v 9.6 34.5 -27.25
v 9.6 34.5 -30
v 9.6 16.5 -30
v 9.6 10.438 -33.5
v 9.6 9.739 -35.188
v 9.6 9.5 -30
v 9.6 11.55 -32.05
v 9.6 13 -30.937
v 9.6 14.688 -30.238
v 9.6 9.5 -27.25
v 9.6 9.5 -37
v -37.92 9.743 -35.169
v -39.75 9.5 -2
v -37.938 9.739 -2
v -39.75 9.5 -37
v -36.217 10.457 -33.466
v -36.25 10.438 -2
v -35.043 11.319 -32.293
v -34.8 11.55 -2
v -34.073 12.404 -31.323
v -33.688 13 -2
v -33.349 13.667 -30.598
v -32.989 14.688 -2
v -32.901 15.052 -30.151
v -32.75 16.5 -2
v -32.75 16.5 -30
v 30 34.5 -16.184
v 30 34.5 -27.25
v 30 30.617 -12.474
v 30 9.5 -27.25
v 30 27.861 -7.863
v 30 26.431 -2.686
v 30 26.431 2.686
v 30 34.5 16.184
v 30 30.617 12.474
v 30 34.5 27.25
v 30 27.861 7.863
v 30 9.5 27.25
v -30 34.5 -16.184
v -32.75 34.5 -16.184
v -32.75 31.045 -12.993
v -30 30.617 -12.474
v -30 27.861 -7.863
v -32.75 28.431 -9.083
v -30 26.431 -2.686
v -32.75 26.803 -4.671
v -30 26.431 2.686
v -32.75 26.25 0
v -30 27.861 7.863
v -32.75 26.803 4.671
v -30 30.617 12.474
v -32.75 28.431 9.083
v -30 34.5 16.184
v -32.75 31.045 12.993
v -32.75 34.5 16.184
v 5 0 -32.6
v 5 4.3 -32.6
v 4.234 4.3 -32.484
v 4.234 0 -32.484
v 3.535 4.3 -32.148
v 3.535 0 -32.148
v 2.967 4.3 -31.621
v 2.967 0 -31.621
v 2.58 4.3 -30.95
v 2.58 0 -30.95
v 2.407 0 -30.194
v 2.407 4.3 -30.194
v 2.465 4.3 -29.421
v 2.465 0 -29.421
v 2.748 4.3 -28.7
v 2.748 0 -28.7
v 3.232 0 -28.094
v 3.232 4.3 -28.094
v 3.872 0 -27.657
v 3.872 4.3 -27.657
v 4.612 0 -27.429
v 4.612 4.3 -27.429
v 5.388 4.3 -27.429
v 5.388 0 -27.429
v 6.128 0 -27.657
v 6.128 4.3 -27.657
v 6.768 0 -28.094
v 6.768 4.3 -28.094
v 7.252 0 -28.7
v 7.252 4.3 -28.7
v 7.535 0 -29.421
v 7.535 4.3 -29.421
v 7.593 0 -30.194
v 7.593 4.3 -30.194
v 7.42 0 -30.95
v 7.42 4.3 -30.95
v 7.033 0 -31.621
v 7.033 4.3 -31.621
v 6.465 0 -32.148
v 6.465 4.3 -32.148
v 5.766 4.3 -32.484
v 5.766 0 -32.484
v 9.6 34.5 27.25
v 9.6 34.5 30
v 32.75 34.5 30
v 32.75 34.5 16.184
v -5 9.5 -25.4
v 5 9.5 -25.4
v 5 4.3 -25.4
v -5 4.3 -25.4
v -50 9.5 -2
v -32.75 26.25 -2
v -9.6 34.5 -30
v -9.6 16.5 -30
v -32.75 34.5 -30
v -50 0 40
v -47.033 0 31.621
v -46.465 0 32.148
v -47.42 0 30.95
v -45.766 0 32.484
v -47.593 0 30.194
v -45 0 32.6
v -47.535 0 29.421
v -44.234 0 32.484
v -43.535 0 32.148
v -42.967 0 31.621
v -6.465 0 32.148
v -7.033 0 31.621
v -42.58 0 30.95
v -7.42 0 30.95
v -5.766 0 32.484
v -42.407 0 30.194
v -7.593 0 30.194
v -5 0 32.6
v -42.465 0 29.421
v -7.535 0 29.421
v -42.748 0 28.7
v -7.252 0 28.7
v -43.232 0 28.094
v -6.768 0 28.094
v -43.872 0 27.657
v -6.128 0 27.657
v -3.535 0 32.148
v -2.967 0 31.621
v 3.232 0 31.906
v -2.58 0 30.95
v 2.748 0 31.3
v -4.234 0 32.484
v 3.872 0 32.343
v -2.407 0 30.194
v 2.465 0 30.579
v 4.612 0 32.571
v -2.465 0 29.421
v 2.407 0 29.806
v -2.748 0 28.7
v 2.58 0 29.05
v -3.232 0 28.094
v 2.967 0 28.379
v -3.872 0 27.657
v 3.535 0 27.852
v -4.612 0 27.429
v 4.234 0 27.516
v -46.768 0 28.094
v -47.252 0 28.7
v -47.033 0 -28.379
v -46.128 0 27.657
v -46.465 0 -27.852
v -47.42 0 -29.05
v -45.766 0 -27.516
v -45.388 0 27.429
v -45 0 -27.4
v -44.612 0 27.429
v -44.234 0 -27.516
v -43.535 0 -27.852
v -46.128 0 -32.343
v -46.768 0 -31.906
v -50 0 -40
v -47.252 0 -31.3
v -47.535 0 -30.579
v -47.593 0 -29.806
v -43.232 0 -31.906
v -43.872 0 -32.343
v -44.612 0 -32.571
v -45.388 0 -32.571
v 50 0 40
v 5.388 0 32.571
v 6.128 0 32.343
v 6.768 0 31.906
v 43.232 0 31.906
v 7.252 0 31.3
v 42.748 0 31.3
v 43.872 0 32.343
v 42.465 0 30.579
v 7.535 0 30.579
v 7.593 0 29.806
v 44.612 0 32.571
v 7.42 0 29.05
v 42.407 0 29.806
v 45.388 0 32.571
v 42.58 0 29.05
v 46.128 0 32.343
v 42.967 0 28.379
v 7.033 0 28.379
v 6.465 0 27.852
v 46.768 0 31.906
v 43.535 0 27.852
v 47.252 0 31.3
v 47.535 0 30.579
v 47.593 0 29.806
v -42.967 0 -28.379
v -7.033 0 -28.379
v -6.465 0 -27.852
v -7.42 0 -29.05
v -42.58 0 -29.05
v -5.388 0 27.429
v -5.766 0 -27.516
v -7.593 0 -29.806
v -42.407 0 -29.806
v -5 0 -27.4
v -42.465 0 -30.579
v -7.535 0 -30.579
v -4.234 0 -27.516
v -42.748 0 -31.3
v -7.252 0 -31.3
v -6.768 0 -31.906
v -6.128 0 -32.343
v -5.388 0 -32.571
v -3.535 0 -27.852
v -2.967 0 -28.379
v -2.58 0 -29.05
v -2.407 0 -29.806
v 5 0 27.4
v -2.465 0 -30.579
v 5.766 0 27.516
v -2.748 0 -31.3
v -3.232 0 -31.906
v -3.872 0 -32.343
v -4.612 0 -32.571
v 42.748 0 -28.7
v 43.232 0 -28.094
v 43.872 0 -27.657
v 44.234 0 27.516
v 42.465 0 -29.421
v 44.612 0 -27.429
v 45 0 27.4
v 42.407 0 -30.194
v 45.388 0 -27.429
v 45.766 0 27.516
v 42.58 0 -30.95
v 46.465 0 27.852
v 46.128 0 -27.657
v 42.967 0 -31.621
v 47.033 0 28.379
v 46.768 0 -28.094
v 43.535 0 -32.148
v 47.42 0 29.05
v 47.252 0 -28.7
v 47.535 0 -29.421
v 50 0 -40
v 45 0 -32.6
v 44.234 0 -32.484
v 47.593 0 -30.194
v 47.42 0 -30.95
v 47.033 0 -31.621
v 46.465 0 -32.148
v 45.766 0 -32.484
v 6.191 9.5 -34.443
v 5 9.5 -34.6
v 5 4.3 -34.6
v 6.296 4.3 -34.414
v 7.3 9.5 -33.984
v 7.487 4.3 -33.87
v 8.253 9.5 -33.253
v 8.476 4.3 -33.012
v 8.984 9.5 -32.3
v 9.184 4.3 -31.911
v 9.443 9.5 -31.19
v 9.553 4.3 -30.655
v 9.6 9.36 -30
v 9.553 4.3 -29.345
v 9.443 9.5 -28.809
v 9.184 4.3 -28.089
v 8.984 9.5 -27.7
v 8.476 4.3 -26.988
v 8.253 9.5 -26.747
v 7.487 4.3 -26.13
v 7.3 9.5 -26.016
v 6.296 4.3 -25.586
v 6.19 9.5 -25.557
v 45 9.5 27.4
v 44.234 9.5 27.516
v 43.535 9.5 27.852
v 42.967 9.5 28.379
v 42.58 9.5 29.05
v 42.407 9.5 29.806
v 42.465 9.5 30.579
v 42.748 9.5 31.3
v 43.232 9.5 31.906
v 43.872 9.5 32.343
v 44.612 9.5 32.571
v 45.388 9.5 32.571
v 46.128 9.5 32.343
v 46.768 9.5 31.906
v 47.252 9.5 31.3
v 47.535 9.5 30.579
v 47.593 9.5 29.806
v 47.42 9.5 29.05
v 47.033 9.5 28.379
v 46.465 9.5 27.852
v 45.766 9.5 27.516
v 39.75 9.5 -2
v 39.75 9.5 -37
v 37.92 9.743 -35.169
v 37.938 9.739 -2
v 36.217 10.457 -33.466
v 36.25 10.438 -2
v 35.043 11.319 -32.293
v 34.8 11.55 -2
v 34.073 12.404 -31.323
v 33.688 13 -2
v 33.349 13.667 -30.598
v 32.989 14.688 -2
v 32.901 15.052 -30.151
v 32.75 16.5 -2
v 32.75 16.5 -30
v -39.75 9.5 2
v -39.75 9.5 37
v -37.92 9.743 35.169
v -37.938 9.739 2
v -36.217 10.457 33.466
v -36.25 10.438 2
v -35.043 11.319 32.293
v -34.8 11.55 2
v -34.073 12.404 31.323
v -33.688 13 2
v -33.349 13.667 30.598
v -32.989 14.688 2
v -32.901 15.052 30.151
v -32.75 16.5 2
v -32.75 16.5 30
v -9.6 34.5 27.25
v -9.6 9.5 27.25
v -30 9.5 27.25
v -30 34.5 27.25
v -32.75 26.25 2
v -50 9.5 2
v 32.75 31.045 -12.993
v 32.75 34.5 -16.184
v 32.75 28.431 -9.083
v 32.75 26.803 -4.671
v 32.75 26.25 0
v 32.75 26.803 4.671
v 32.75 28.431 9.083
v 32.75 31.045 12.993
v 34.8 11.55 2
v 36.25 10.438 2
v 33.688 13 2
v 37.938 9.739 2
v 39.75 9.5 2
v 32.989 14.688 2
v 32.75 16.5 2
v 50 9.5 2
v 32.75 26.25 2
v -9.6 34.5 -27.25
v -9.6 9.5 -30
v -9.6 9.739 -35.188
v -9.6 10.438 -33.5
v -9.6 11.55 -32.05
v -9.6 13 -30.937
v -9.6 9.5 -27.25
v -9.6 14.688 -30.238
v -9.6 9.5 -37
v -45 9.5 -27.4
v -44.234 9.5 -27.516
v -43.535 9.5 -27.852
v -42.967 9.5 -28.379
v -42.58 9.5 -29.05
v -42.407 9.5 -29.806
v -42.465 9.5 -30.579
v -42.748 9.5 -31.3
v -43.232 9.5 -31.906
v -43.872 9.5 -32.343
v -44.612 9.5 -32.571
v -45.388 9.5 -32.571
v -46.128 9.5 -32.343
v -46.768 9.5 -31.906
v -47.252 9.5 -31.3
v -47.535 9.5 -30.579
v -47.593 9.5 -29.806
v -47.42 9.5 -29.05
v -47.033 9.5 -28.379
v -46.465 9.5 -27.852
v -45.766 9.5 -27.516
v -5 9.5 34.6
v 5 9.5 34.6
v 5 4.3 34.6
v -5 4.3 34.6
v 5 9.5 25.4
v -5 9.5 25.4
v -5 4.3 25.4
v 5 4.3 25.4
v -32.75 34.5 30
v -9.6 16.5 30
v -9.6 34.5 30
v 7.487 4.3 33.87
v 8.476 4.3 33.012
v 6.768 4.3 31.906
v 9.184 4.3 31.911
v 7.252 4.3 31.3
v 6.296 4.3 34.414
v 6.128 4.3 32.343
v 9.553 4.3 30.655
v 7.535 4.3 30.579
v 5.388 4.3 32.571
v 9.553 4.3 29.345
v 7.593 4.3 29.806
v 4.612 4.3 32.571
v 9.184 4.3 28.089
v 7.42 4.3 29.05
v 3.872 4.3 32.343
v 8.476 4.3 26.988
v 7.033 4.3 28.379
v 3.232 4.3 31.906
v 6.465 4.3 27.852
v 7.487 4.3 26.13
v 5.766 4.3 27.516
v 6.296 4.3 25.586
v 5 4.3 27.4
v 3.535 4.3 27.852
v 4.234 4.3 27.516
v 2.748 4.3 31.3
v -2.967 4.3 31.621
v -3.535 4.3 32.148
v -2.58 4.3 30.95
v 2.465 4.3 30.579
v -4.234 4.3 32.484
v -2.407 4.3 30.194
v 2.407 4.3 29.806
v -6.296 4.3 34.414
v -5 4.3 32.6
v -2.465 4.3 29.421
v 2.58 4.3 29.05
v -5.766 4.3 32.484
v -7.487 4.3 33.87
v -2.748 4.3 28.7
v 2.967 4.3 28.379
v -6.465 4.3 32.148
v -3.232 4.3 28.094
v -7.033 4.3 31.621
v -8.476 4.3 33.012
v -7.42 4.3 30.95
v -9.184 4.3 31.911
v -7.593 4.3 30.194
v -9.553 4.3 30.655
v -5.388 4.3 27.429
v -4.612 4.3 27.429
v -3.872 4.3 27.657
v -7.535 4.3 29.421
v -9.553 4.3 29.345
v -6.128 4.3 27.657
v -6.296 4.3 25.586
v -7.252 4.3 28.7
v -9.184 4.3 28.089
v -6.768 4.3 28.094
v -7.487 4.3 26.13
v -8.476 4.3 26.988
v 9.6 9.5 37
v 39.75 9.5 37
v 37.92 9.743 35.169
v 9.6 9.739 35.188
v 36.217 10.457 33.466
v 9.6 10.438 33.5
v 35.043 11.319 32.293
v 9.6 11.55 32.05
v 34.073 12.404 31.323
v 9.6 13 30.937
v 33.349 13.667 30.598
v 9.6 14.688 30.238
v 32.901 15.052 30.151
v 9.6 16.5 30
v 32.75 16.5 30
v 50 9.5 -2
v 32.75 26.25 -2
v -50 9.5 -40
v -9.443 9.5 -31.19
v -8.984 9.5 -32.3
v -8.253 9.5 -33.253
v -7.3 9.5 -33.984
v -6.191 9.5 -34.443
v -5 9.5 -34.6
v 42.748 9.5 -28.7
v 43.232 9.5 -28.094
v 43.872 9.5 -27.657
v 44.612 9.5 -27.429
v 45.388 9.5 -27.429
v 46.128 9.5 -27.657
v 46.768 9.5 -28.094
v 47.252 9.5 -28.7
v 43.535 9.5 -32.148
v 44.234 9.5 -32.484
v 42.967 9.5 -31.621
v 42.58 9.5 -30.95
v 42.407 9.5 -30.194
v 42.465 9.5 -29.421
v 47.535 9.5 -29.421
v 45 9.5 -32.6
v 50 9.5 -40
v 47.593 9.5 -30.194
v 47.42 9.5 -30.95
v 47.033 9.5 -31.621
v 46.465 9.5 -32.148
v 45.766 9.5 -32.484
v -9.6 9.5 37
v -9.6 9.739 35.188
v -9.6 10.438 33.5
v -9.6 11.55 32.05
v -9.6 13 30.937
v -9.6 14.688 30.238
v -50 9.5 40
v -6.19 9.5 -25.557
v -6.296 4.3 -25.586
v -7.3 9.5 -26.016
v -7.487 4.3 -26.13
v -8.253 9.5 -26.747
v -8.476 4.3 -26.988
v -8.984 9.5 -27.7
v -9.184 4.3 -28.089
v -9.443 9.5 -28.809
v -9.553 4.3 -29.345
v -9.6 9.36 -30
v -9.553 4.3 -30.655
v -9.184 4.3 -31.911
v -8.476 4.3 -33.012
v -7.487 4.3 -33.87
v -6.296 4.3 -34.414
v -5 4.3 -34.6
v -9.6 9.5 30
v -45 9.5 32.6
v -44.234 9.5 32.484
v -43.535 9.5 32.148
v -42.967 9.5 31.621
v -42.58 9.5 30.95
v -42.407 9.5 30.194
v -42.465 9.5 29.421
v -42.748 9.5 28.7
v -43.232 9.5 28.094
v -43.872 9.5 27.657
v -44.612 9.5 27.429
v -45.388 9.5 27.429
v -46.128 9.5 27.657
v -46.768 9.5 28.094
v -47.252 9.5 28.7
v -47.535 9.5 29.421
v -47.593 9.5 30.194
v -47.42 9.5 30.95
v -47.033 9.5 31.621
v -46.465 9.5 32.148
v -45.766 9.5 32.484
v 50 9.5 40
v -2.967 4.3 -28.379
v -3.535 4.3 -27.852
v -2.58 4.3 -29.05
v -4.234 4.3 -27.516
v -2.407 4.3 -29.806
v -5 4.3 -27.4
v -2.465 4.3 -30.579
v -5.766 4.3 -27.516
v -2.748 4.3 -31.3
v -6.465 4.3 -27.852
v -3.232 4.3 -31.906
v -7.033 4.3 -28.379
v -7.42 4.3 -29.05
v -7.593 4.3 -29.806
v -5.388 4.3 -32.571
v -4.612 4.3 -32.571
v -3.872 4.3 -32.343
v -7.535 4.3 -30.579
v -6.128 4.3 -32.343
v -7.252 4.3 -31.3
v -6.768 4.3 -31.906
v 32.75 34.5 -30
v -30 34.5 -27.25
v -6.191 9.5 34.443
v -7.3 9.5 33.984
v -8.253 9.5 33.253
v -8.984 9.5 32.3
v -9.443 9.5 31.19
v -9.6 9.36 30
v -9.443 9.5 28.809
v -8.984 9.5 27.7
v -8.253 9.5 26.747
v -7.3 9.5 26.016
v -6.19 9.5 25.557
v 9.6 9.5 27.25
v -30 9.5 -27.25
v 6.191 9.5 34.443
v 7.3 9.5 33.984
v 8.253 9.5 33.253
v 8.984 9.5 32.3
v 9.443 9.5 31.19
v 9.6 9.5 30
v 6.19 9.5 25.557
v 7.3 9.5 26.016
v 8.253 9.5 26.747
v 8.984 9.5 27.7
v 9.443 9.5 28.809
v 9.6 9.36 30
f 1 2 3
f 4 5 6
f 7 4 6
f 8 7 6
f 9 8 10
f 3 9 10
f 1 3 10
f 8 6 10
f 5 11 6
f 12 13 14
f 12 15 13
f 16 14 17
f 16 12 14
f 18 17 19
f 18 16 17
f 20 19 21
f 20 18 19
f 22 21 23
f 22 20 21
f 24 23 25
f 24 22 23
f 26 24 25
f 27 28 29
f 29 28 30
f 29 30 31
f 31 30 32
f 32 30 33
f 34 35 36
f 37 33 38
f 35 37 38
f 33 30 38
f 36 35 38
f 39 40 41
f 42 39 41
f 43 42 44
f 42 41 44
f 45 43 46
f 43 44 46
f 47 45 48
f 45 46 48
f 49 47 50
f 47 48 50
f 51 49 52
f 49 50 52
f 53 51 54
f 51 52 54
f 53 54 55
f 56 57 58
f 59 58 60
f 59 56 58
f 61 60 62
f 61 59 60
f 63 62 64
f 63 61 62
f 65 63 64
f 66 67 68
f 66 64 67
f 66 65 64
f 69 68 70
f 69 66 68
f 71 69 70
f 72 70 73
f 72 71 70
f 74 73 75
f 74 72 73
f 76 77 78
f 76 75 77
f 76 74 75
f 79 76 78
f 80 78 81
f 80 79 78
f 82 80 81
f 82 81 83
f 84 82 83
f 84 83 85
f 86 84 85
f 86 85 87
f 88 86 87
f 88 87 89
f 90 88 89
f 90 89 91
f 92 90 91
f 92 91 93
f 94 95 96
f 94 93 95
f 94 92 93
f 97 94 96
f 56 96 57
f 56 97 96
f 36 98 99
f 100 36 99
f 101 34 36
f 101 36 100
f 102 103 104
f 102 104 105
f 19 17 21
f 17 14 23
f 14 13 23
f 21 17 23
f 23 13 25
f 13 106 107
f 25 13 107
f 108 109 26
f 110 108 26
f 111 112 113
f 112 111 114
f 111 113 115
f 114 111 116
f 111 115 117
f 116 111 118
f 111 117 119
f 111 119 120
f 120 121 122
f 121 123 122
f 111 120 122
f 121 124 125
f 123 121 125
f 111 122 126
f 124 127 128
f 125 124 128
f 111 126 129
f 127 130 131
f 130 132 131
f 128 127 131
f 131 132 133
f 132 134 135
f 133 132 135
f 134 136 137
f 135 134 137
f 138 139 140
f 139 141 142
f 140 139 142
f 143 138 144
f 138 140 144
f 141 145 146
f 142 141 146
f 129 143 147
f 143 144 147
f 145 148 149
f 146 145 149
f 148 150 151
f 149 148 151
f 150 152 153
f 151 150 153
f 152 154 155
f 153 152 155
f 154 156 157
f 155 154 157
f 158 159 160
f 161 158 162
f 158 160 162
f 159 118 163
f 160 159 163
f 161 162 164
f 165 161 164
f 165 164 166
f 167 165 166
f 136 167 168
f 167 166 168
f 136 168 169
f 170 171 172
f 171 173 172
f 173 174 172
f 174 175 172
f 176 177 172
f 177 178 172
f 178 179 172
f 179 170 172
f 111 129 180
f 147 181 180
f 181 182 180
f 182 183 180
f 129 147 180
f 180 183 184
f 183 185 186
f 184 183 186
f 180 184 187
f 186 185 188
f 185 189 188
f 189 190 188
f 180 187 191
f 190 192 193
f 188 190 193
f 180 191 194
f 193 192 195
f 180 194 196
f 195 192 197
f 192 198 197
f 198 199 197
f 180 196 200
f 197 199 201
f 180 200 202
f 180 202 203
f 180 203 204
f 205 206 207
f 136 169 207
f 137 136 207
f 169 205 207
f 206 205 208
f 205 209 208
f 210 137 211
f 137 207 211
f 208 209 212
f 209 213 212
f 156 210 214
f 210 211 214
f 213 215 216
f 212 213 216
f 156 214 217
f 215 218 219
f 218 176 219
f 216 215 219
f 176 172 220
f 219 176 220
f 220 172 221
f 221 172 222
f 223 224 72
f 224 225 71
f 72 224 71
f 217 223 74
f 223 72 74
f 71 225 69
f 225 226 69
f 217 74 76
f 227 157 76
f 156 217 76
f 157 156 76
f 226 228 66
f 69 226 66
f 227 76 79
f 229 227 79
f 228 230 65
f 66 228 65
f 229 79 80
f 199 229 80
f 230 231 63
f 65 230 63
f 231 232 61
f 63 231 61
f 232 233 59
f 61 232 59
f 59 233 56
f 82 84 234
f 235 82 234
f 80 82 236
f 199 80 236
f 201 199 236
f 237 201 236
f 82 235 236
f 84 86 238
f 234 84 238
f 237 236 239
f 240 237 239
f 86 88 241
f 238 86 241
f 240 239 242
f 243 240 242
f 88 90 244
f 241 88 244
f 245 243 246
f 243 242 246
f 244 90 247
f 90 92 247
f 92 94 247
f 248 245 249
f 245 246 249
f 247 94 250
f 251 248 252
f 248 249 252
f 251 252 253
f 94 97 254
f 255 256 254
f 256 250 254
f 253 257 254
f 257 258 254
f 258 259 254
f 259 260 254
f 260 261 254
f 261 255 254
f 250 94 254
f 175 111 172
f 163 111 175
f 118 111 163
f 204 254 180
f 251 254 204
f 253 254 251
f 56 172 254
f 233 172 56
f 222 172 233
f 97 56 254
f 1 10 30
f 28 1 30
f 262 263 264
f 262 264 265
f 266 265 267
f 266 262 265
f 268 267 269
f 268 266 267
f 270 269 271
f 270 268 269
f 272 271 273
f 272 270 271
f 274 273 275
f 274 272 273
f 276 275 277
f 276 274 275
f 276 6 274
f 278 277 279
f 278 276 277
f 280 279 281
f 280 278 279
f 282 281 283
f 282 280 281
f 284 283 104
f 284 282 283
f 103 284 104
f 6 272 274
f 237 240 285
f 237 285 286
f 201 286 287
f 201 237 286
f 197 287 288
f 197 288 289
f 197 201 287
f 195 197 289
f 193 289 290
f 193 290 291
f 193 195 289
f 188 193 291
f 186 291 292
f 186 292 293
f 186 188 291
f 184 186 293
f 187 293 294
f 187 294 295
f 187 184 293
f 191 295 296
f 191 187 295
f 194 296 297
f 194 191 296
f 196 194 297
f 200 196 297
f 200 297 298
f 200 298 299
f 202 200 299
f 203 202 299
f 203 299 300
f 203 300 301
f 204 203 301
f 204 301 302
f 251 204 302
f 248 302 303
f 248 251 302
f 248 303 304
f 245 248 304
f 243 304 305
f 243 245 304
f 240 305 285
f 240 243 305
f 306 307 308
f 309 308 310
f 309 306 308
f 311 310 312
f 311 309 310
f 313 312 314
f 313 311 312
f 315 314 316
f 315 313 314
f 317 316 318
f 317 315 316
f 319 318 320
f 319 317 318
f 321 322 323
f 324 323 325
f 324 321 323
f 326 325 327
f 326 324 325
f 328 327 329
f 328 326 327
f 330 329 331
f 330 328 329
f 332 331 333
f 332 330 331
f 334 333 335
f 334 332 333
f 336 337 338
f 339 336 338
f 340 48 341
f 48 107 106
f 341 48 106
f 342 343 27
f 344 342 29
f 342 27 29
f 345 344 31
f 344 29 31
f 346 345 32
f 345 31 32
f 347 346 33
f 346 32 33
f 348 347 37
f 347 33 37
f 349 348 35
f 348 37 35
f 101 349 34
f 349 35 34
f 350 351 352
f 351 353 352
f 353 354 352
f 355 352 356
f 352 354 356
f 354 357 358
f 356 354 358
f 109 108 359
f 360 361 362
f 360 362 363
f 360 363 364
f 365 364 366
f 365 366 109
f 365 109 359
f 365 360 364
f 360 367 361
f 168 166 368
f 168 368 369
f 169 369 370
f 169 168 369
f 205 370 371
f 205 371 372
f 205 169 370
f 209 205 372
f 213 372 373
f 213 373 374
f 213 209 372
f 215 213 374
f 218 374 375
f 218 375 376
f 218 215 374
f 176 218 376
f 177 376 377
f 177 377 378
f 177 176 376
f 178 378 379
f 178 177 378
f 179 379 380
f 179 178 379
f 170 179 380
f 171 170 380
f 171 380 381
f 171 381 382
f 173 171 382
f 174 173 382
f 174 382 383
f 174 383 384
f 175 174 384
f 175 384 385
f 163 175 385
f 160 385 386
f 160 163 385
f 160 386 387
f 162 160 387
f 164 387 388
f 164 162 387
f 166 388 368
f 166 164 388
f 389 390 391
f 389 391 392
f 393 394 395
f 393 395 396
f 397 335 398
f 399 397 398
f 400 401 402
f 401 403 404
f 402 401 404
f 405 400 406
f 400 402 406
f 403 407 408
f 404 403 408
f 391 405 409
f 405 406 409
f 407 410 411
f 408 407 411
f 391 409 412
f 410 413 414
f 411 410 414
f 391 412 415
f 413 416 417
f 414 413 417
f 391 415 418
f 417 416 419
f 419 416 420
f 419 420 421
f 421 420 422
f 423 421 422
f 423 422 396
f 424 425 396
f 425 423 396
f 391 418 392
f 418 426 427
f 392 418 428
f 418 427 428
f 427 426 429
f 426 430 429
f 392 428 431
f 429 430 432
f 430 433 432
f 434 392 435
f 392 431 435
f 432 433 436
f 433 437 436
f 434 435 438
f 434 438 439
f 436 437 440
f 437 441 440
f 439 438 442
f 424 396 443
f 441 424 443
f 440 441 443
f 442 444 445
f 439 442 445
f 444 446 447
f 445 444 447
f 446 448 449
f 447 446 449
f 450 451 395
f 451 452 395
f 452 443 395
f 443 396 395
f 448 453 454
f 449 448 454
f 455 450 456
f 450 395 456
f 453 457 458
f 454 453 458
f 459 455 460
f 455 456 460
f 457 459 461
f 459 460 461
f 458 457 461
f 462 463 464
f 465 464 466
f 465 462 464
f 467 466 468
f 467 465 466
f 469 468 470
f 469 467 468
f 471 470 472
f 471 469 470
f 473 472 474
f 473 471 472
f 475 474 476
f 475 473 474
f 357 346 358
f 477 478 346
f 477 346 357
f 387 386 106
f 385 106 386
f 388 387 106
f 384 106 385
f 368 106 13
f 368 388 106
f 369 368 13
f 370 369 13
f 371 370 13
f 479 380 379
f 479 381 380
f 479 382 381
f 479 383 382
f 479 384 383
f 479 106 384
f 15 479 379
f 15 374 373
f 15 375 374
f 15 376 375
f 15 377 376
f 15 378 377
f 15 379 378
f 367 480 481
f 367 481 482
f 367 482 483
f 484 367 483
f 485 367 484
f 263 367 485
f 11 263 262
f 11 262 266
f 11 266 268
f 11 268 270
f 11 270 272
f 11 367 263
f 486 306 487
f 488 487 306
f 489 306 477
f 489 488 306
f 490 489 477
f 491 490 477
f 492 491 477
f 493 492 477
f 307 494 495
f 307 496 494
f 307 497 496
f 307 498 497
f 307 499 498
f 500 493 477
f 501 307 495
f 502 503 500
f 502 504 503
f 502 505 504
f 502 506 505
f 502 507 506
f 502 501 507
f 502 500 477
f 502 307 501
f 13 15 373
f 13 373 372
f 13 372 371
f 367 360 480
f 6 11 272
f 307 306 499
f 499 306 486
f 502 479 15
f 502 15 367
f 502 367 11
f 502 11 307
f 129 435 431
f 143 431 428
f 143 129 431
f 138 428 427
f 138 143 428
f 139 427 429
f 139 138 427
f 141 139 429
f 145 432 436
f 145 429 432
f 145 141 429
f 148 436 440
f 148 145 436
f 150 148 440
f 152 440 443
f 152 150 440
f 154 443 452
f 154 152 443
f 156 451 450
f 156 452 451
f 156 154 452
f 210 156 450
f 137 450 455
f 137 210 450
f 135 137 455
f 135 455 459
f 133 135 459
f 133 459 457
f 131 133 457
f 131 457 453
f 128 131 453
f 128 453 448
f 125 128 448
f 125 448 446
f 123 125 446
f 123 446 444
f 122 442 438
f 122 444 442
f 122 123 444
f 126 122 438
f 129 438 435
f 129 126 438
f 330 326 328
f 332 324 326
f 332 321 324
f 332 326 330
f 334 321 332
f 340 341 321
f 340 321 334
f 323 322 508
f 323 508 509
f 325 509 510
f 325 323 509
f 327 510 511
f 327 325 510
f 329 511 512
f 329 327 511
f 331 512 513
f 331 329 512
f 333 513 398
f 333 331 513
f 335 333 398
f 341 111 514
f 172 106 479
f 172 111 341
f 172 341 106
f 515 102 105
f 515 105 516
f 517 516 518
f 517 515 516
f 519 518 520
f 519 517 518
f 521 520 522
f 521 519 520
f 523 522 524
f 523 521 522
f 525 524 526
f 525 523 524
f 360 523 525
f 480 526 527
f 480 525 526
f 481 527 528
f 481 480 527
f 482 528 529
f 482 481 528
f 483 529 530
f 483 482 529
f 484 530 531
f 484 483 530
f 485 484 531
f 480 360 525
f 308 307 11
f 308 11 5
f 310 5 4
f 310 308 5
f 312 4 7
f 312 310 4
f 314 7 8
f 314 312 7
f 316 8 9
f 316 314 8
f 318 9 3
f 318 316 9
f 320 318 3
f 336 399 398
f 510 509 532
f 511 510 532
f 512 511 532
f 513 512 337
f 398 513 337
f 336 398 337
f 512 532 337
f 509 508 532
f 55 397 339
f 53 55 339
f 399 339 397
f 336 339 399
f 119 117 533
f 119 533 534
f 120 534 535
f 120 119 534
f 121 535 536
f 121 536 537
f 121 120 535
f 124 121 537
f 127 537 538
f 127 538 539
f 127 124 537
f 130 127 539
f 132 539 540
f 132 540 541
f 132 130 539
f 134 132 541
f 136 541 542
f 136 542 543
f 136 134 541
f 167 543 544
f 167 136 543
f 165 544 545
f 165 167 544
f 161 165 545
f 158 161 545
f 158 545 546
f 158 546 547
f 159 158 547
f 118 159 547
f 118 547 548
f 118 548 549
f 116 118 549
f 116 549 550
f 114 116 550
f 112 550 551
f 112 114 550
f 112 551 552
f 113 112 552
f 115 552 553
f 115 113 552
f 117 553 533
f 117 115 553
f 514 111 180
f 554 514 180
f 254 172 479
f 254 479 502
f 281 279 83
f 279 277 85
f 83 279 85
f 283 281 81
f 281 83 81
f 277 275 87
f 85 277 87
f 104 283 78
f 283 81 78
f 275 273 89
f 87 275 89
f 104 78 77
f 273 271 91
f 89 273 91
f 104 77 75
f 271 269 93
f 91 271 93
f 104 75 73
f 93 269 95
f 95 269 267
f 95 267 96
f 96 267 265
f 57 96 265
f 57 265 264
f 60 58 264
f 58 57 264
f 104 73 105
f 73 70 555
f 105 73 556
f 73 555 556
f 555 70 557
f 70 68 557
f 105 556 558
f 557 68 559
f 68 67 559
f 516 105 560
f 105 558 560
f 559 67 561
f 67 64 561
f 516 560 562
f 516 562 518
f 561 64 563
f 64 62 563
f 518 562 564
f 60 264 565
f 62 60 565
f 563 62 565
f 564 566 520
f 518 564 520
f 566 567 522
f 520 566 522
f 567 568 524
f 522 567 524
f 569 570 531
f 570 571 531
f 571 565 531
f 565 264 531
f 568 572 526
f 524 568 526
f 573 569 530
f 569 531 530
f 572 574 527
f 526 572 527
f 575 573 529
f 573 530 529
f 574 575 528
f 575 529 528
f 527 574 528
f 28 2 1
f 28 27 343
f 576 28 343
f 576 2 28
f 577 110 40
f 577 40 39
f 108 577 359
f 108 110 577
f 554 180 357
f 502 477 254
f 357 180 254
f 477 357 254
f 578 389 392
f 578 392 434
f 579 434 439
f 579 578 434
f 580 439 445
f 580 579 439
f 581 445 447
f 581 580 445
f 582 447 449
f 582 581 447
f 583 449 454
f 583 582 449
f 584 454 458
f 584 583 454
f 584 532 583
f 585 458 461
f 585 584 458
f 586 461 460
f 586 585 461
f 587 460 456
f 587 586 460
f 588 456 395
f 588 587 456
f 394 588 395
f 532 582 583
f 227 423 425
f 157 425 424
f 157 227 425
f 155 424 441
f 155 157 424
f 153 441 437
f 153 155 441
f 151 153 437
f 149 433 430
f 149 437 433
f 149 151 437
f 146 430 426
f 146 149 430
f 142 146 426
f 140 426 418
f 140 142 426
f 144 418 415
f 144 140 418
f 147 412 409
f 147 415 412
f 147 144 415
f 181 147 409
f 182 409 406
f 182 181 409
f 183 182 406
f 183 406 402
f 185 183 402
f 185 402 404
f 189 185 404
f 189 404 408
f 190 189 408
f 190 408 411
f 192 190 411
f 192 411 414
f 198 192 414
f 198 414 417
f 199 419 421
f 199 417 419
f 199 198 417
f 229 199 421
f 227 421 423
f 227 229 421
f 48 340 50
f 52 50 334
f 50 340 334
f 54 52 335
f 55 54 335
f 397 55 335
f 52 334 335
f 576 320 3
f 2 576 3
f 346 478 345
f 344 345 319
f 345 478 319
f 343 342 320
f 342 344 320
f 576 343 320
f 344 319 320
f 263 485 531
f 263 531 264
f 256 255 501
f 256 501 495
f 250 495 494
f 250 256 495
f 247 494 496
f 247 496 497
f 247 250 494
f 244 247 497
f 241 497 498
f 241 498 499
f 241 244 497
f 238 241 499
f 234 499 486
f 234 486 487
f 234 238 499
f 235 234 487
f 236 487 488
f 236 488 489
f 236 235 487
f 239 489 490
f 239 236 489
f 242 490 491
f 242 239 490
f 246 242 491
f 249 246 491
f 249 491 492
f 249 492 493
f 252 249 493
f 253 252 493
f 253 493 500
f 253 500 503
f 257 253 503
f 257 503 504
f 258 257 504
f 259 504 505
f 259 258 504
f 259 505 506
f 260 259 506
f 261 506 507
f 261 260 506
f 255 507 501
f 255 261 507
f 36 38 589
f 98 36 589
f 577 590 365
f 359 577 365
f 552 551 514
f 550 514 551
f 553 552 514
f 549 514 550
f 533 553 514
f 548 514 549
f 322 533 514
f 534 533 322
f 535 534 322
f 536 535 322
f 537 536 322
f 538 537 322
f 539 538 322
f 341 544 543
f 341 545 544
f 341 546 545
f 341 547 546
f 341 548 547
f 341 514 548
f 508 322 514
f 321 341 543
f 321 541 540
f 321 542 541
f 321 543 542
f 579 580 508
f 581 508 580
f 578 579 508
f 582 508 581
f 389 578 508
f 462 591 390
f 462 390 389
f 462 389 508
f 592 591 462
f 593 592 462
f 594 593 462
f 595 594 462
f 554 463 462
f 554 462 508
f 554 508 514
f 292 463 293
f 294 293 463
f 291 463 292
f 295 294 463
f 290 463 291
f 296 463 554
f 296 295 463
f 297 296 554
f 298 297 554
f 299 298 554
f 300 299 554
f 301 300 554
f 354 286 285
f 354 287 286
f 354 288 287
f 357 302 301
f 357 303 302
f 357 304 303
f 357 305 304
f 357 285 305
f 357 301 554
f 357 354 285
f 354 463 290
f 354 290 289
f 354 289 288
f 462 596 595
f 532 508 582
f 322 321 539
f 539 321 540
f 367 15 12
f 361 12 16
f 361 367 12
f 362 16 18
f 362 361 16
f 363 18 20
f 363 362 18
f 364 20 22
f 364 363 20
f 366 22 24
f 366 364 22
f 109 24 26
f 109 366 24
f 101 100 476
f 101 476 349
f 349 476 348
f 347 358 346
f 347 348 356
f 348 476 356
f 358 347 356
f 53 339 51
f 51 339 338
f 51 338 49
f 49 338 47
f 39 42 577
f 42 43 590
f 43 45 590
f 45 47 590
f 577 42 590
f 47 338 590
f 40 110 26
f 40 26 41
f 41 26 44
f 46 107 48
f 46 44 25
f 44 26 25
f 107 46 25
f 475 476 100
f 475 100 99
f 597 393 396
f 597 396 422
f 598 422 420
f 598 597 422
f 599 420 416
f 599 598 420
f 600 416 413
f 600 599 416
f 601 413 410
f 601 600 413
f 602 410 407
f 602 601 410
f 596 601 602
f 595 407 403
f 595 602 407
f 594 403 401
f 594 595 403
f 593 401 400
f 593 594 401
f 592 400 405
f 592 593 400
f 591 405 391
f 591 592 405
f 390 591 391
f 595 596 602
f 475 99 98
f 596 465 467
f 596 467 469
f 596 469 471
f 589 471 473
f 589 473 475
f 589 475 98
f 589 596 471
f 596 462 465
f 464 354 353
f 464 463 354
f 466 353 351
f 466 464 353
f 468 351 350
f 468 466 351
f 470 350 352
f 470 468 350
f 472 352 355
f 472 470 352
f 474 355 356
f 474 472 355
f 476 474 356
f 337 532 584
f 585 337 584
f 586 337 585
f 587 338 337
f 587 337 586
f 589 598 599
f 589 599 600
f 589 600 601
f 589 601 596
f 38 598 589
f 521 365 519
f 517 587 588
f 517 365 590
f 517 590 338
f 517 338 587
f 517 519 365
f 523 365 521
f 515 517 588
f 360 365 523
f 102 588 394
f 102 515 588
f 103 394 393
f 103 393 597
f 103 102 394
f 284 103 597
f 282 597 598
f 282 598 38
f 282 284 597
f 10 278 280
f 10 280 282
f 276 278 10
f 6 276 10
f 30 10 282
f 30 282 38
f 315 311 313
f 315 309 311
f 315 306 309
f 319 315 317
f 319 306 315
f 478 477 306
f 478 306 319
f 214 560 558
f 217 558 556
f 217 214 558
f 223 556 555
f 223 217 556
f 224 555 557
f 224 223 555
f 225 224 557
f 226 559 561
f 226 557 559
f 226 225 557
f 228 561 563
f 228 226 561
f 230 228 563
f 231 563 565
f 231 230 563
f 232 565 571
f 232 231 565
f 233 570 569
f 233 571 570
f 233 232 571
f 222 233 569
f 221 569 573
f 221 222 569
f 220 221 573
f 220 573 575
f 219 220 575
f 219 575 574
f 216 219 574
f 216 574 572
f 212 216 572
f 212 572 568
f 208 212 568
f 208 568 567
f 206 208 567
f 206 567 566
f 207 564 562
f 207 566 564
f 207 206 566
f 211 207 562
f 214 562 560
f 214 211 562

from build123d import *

# Parameters (mm, degrees)
SKETCH_1_W           = 100
SKETCH_1_H           = 80
SKETCH_1_R           = 2.6
EXTRUDE_1_DEPTH      = 9.5
CUT_EXTRUDE_1_DEPTH  = 5.2
EXTRUDE_2_DEPTH      = 25
FILLET_1_R           = 7
SKETCH_7_R           = 20
CUT_EXTRUDE_2_DEPTH  = 99.172361182
EXTRUDE_3_DEPTH      = 2
EXTRUDE_3_DEPTH_BACK = 2


with BuildPart() as part:
    # 草图1 → 凸台-拉伸1 (new body)
    with BuildSketch(Plane(origin=(0, 0, 0), x_dir=(1, 0, 0), z_dir=(0, 1, 0))):
        Rectangle(SKETCH_1_W, SKETCH_1_H)
        with Locations(Location((-45, 30, 0), (0, 0, 270))):
            Circle(SKETCH_1_R, mode=Mode.SUBTRACT)
        with Locations(Location((-5, 30, 0), (0, 0, 270))):
            Circle(SKETCH_1_R, mode=Mode.SUBTRACT)
        with Locations(Location((-5, -30, 0), (0, 0, 270))):
            Circle(SKETCH_1_R, mode=Mode.SUBTRACT)
        with Locations(Location((-45, -30, 0), (0, 0, 270))):
            Circle(SKETCH_1_R, mode=Mode.SUBTRACT)
        with Locations(Location((45, -30, 0), (0, 0, 90))):
            Circle(SKETCH_1_R, mode=Mode.SUBTRACT)
        with Locations(Location((5, -30, 0), (0, 0, 90))):
            Circle(SKETCH_1_R, mode=Mode.SUBTRACT)
        with Locations(Location((5, 30, 0), (0, 0, 90))):
            Circle(SKETCH_1_R, mode=Mode.SUBTRACT)
        with Locations(Location((45, 30, 0), (0, 0, 90))):
            Circle(SKETCH_1_R, mode=Mode.SUBTRACT)
    extrude(amount=EXTRUDE_1_DEPTH)

    # 草图4 → 切除-拉伸1 (cut)
    with BuildSketch(Plane(origin=(0, 9.5, 0), x_dir=(1, 0, 0), z_dir=(0, 1, 0))):
        with BuildLine():
            Line((-5, 34.6), (5, 34.6))
            ThreePointArc((5, 34.6), (9.6, 30), (5, 25.4))
            Line((5, 25.4), (-5, 25.4))
            ThreePointArc((-5, 25.4), (-9.6, 30), (-5, 34.6))
        make_face()
        with BuildLine():
            Line((-5, -25.4), (5, -25.4))
            ThreePointArc((5, -25.4), (9.6, -30), (5, -34.6))
            Line((5, -34.6), (-5, -34.6))
            ThreePointArc((-5, -34.6), (-9.6, -30), (-5, -25.4))
        make_face()
    extrude(amount=-CUT_EXTRUDE_1_DEPTH, mode=Mode.SUBTRACT)

    # 草图5 → 凸台-拉伸2 (add)
    with BuildSketch(Plane(origin=(0, 9.5, 0), x_dir=(1, 0, 0), z_dir=(0, 1, 0))):
        Polygon((-9.6, 27.25), (-9.6, 29.999521433), (-32.75, 29.999521433), (-32.75, -29.999521433), (-9.6, -29.999521433), (-9.6, -27.25), (-30, -27.25), (-30, 27.25), align=None)
        Polygon((32.75, 29.999521433), (9.6, 29.999521433), (9.6, 27.25), (30, 27.25), (30, -27.25), (9.6, -27.25), (9.6, -29.999521433), (32.75, -29.999521433), align=None)
    extrude(amount=EXTRUDE_2_DEPTH)

    # 圆角1
    # the kernel refuses this fillet: 7 mm, written as the material it adds along each edge
    with BuildSketch(Plane(origin=(32.75, 9.5, 29.999521433), x_dir=(1, 0, 0), z_dir=(0, 0, -1)), Plane(origin=(-32.75, 9.5, -29.999521433), x_dir=(-1, 0, 0), z_dir=(0, 0, 1))) as fillet_1_piece_1:
        with BuildLine():
            CenterArc((FILLET_1_R, -FILLET_1_R), FILLET_1_R, 90, 90)
            Line((0, -FILLET_1_R), (-FILLET_1_R * 0.02, -FILLET_1_R))
            Line((-FILLET_1_R * 0.02, -FILLET_1_R), (-FILLET_1_R * 0.02, FILLET_1_R * 0.02))
            Line((-FILLET_1_R * 0.02, FILLET_1_R * 0.02), (FILLET_1_R, FILLET_1_R * 0.02))
            Line((FILLET_1_R, FILLET_1_R * 0.02), (FILLET_1_R, 0))
        make_face()
    extrude(amount=59.999042867)
    with BuildSketch(Plane(origin=(32.75, 9.5, -29.999521433), x_dir=(0, 0, -1), z_dir=(-1, 0, 0)), Plane(origin=(9.6, 9.5, 29.999521433), x_dir=(0, 0, 1), z_dir=(1, 0, 0)), Plane(origin=(-9.6, 9.5, -29.999521433), x_dir=(0, 0, -1), z_dir=(-1, 0, 0)), Plane(origin=(-32.75, 9.5, 29.999521433), x_dir=(0, 0, 1), z_dir=(1, 0, 0))) as fillet_1_piece_2:
        with BuildLine():
            CenterArc((FILLET_1_R, -FILLET_1_R), FILLET_1_R, 90, 90)
            Line((0, -FILLET_1_R), (-FILLET_1_R * 0.02, -FILLET_1_R))
            Line((-FILLET_1_R * 0.02, -FILLET_1_R), (-FILLET_1_R * 0.02, FILLET_1_R * 0.02))
            Line((-FILLET_1_R * 0.02, FILLET_1_R * 0.02), (FILLET_1_R, FILLET_1_R * 0.02))
            Line((FILLET_1_R, FILLET_1_R * 0.02), (FILLET_1_R, 0))
        make_face()
    extrude(amount=23.15)
    with BuildSketch(Plane(origin=(9.6, 9.5, 29.999521433), x_dir=(0, 0, 1), z_dir=(1, 0, 0))) as fillet_1_piece_3a_section:
        with BuildLine():
            CenterArc((FILLET_1_R, -FILLET_1_R), FILLET_1_R, 90, 90)
            Line((0, -FILLET_1_R), (-FILLET_1_R * 0.02, -FILLET_1_R))
            Line((-FILLET_1_R * 0.02, -FILLET_1_R), (-FILLET_1_R * 0.02, FILLET_1_R * 0.02))
            Line((-FILLET_1_R * 0.02, FILLET_1_R * 0.02), (FILLET_1_R, FILLET_1_R * 0.02))
            Line((FILLET_1_R, FILLET_1_R * 0.02), (FILLET_1_R, 0))
        make_face()
    fillet_1_piece_3a = extrude(amount=40.65, mode=Mode.PRIVATE)
    fillet_1_piece_3a = split(fillet_1_piece_3a, bisect_by=Plane(origin=(32.75, 11.0847658, 31.584287233), z_dir=(1, 0, 0)), keep=Keep.TOP, mode=Mode.PRIVATE)
    with BuildSketch(Plane(origin=(32.75, 9.5, 47.499521433), x_dir=(1, 0, 0), z_dir=(0, 0, -1))) as fillet_1_piece_3b_section:
        with BuildLine():
            CenterArc((FILLET_1_R, -FILLET_1_R), FILLET_1_R, 90, 90)
            Line((0, -FILLET_1_R), (-FILLET_1_R * 0.02, -FILLET_1_R))
            Line((-FILLET_1_R * 0.02, -FILLET_1_R), (-FILLET_1_R * 0.02, FILLET_1_R * 0.02))
            Line((-FILLET_1_R * 0.02, FILLET_1_R * 0.02), (FILLET_1_R, FILLET_1_R * 0.02))
            Line((FILLET_1_R, FILLET_1_R * 0.02), (FILLET_1_R, 0))
        make_face()
    fillet_1_piece_3b = extrude(amount=77.499042867, mode=Mode.PRIVATE)
    fillet_1_piece_3b = split(fillet_1_piece_3b, bisect_by=Plane(origin=(34.3347658, 11.0847658, 29.999521433), z_dir=(0, 0, 1)), keep=Keep.TOP, mode=Mode.PRIVATE)
    fillet_1_piece_3 = fillet_1_piece_3a & fillet_1_piece_3b
    add(fillet_1_piece_3)
    with BuildSketch(Plane(origin=(32.75, 9.5, 29.999521433), x_dir=(1, 0, 0), z_dir=(0, 0, -1))) as fillet_1_piece_4a_section:
        with BuildLine():
            CenterArc((FILLET_1_R, -FILLET_1_R), FILLET_1_R, 90, 90)
            Line((0, -FILLET_1_R), (-FILLET_1_R * 0.02, -FILLET_1_R))
            Line((-FILLET_1_R * 0.02, -FILLET_1_R), (-FILLET_1_R * 0.02, FILLET_1_R * 0.02))
            Line((-FILLET_1_R * 0.02, FILLET_1_R * 0.02), (FILLET_1_R, FILLET_1_R * 0.02))
            Line((FILLET_1_R, FILLET_1_R * 0.02), (FILLET_1_R, 0))
        make_face()
    fillet_1_piece_4a = extrude(amount=77.499042867, mode=Mode.PRIVATE)
    fillet_1_piece_4a = split(fillet_1_piece_4a, bisect_by=Plane(origin=(34.3347658, 11.0847658, -29.999521433), z_dir=(0, 0, -1)), keep=Keep.TOP, mode=Mode.PRIVATE)
    with BuildSketch(Plane(origin=(50.25, 9.5, -29.999521433), x_dir=(0, 0, -1), z_dir=(-1, 0, 0))) as fillet_1_piece_4b_section:
        with BuildLine():
            CenterArc((FILLET_1_R, -FILLET_1_R), FILLET_1_R, 90, 90)
            Line((0, -FILLET_1_R), (-FILLET_1_R * 0.02, -FILLET_1_R))
            Line((-FILLET_1_R * 0.02, -FILLET_1_R), (-FILLET_1_R * 0.02, FILLET_1_R * 0.02))
            Line((-FILLET_1_R * 0.02, FILLET_1_R * 0.02), (FILLET_1_R, FILLET_1_R * 0.02))
            Line((FILLET_1_R, FILLET_1_R * 0.02), (FILLET_1_R, 0))
        make_face()
    fillet_1_piece_4b = extrude(amount=40.65, mode=Mode.PRIVATE)
    fillet_1_piece_4b = split(fillet_1_piece_4b, bisect_by=Plane(origin=(32.75, 11.0847658, -31.584287233), z_dir=(1, 0, 0)), keep=Keep.TOP, mode=Mode.PRIVATE)
    fillet_1_piece_4 = fillet_1_piece_4a & fillet_1_piece_4b
    add(fillet_1_piece_4)
    with BuildSketch(Plane(origin=(-9.6, 9.5, -29.999521433), x_dir=(0, 0, -1), z_dir=(-1, 0, 0))) as fillet_1_piece_5a_section:
        with BuildLine():
            CenterArc((FILLET_1_R, -FILLET_1_R), FILLET_1_R, 90, 90)
            Line((0, -FILLET_1_R), (-FILLET_1_R * 0.02, -FILLET_1_R))
            Line((-FILLET_1_R * 0.02, -FILLET_1_R), (-FILLET_1_R * 0.02, FILLET_1_R * 0.02))
            Line((-FILLET_1_R * 0.02, FILLET_1_R * 0.02), (FILLET_1_R, FILLET_1_R * 0.02))
            Line((FILLET_1_R, FILLET_1_R * 0.02), (FILLET_1_R, 0))
        make_face()
    fillet_1_piece_5a = extrude(amount=40.65, mode=Mode.PRIVATE)
    fillet_1_piece_5a = split(fillet_1_piece_5a, bisect_by=Plane(origin=(-32.75, 11.0847658, -31.584287233), z_dir=(-1, 0, 0)), keep=Keep.TOP, mode=Mode.PRIVATE)
    with BuildSketch(Plane(origin=(-32.75, 9.5, -47.499521433), x_dir=(-1, 0, 0), z_dir=(0, 0, 1))) as fillet_1_piece_5b_section:
        with BuildLine():
            CenterArc((FILLET_1_R, -FILLET_1_R), FILLET_1_R, 90, 90)
            Line((0, -FILLET_1_R), (-FILLET_1_R * 0.02, -FILLET_1_R))
            Line((-FILLET_1_R * 0.02, -FILLET_1_R), (-FILLET_1_R * 0.02, FILLET_1_R * 0.02))
            Line((-FILLET_1_R * 0.02, FILLET_1_R * 0.02), (FILLET_1_R, FILLET_1_R * 0.02))
            Line((FILLET_1_R, FILLET_1_R * 0.02), (FILLET_1_R, 0))
        make_face()
    fillet_1_piece_5b = extrude(amount=77.499042867, mode=Mode.PRIVATE)
    fillet_1_piece_5b = split(fillet_1_piece_5b, bisect_by=Plane(origin=(-34.3347658, 11.0847658, -29.999521433), z_dir=(0, 0, -1)), keep=Keep.TOP, mode=Mode.PRIVATE)
    fillet_1_piece_5 = fillet_1_piece_5a & fillet_1_piece_5b
    add(fillet_1_piece_5)
    with BuildSketch(Plane(origin=(-32.75, 9.5, -29.999521433), x_dir=(-1, 0, 0), z_dir=(0, 0, 1))) as fillet_1_piece_6a_section:
        with BuildLine():
            CenterArc((FILLET_1_R, -FILLET_1_R), FILLET_1_R, 90, 90)
            Line((0, -FILLET_1_R), (-FILLET_1_R * 0.02, -FILLET_1_R))
            Line((-FILLET_1_R * 0.02, -FILLET_1_R), (-FILLET_1_R * 0.02, FILLET_1_R * 0.02))
            Line((-FILLET_1_R * 0.02, FILLET_1_R * 0.02), (FILLET_1_R, FILLET_1_R * 0.02))
            Line((FILLET_1_R, FILLET_1_R * 0.02), (FILLET_1_R, 0))
        make_face()
    fillet_1_piece_6a = extrude(amount=77.499042867, mode=Mode.PRIVATE)
    fillet_1_piece_6a = split(fillet_1_piece_6a, bisect_by=Plane(origin=(-34.3347658, 11.0847658, 29.999521433), z_dir=(0, 0, 1)), keep=Keep.TOP, mode=Mode.PRIVATE)
    with BuildSketch(Plane(origin=(-50.25, 9.5, 29.999521433), x_dir=(0, 0, 1), z_dir=(1, 0, 0))) as fillet_1_piece_6b_section:
        with BuildLine():
            CenterArc((FILLET_1_R, -FILLET_1_R), FILLET_1_R, 90, 90)
            Line((0, -FILLET_1_R), (-FILLET_1_R * 0.02, -FILLET_1_R))
            Line((-FILLET_1_R * 0.02, -FILLET_1_R), (-FILLET_1_R * 0.02, FILLET_1_R * 0.02))
            Line((-FILLET_1_R * 0.02, FILLET_1_R * 0.02), (FILLET_1_R, FILLET_1_R * 0.02))
            Line((FILLET_1_R, FILLET_1_R * 0.02), (FILLET_1_R, 0))
        make_face()
    fillet_1_piece_6b = extrude(amount=40.65, mode=Mode.PRIVATE)
    fillet_1_piece_6b = split(fillet_1_piece_6b, bisect_by=Plane(origin=(-32.75, 11.0847658, 31.584287233), z_dir=(-1, 0, 0)), keep=Keep.TOP, mode=Mode.PRIVATE)
    fillet_1_piece_6 = fillet_1_piece_6a & fillet_1_piece_6b
    add(fillet_1_piece_6)

    # 草图7 → 切除-拉伸2 (cut, through all)
    with BuildSketch(Plane.ZY.offset(32.75)):
        with Locations((0, 46.25)):
            Circle(SKETCH_7_R)
    extrude(amount=-CUT_EXTRUDE_2_DEPTH, mode=Mode.SUBTRACT)

    # 草图6 → 凸台-拉伸3 (add, two sides: drawn at the far end of the back side and taken through both)
    with BuildSketch(Plane.XY.offset(-EXTRUDE_3_DEPTH_BACK)):
        Polygon((-32.75, 26.25), (-50, 9.5), (-32.75, 9.5), align=None)
        Polygon((32.75, 9.5), (32.75, 26.25), (50, 9.5), align=None)
    extrude(amount=EXTRUDE_3_DEPTH + EXTRUDE_3_DEPTH_BACK)


solid = part.part
